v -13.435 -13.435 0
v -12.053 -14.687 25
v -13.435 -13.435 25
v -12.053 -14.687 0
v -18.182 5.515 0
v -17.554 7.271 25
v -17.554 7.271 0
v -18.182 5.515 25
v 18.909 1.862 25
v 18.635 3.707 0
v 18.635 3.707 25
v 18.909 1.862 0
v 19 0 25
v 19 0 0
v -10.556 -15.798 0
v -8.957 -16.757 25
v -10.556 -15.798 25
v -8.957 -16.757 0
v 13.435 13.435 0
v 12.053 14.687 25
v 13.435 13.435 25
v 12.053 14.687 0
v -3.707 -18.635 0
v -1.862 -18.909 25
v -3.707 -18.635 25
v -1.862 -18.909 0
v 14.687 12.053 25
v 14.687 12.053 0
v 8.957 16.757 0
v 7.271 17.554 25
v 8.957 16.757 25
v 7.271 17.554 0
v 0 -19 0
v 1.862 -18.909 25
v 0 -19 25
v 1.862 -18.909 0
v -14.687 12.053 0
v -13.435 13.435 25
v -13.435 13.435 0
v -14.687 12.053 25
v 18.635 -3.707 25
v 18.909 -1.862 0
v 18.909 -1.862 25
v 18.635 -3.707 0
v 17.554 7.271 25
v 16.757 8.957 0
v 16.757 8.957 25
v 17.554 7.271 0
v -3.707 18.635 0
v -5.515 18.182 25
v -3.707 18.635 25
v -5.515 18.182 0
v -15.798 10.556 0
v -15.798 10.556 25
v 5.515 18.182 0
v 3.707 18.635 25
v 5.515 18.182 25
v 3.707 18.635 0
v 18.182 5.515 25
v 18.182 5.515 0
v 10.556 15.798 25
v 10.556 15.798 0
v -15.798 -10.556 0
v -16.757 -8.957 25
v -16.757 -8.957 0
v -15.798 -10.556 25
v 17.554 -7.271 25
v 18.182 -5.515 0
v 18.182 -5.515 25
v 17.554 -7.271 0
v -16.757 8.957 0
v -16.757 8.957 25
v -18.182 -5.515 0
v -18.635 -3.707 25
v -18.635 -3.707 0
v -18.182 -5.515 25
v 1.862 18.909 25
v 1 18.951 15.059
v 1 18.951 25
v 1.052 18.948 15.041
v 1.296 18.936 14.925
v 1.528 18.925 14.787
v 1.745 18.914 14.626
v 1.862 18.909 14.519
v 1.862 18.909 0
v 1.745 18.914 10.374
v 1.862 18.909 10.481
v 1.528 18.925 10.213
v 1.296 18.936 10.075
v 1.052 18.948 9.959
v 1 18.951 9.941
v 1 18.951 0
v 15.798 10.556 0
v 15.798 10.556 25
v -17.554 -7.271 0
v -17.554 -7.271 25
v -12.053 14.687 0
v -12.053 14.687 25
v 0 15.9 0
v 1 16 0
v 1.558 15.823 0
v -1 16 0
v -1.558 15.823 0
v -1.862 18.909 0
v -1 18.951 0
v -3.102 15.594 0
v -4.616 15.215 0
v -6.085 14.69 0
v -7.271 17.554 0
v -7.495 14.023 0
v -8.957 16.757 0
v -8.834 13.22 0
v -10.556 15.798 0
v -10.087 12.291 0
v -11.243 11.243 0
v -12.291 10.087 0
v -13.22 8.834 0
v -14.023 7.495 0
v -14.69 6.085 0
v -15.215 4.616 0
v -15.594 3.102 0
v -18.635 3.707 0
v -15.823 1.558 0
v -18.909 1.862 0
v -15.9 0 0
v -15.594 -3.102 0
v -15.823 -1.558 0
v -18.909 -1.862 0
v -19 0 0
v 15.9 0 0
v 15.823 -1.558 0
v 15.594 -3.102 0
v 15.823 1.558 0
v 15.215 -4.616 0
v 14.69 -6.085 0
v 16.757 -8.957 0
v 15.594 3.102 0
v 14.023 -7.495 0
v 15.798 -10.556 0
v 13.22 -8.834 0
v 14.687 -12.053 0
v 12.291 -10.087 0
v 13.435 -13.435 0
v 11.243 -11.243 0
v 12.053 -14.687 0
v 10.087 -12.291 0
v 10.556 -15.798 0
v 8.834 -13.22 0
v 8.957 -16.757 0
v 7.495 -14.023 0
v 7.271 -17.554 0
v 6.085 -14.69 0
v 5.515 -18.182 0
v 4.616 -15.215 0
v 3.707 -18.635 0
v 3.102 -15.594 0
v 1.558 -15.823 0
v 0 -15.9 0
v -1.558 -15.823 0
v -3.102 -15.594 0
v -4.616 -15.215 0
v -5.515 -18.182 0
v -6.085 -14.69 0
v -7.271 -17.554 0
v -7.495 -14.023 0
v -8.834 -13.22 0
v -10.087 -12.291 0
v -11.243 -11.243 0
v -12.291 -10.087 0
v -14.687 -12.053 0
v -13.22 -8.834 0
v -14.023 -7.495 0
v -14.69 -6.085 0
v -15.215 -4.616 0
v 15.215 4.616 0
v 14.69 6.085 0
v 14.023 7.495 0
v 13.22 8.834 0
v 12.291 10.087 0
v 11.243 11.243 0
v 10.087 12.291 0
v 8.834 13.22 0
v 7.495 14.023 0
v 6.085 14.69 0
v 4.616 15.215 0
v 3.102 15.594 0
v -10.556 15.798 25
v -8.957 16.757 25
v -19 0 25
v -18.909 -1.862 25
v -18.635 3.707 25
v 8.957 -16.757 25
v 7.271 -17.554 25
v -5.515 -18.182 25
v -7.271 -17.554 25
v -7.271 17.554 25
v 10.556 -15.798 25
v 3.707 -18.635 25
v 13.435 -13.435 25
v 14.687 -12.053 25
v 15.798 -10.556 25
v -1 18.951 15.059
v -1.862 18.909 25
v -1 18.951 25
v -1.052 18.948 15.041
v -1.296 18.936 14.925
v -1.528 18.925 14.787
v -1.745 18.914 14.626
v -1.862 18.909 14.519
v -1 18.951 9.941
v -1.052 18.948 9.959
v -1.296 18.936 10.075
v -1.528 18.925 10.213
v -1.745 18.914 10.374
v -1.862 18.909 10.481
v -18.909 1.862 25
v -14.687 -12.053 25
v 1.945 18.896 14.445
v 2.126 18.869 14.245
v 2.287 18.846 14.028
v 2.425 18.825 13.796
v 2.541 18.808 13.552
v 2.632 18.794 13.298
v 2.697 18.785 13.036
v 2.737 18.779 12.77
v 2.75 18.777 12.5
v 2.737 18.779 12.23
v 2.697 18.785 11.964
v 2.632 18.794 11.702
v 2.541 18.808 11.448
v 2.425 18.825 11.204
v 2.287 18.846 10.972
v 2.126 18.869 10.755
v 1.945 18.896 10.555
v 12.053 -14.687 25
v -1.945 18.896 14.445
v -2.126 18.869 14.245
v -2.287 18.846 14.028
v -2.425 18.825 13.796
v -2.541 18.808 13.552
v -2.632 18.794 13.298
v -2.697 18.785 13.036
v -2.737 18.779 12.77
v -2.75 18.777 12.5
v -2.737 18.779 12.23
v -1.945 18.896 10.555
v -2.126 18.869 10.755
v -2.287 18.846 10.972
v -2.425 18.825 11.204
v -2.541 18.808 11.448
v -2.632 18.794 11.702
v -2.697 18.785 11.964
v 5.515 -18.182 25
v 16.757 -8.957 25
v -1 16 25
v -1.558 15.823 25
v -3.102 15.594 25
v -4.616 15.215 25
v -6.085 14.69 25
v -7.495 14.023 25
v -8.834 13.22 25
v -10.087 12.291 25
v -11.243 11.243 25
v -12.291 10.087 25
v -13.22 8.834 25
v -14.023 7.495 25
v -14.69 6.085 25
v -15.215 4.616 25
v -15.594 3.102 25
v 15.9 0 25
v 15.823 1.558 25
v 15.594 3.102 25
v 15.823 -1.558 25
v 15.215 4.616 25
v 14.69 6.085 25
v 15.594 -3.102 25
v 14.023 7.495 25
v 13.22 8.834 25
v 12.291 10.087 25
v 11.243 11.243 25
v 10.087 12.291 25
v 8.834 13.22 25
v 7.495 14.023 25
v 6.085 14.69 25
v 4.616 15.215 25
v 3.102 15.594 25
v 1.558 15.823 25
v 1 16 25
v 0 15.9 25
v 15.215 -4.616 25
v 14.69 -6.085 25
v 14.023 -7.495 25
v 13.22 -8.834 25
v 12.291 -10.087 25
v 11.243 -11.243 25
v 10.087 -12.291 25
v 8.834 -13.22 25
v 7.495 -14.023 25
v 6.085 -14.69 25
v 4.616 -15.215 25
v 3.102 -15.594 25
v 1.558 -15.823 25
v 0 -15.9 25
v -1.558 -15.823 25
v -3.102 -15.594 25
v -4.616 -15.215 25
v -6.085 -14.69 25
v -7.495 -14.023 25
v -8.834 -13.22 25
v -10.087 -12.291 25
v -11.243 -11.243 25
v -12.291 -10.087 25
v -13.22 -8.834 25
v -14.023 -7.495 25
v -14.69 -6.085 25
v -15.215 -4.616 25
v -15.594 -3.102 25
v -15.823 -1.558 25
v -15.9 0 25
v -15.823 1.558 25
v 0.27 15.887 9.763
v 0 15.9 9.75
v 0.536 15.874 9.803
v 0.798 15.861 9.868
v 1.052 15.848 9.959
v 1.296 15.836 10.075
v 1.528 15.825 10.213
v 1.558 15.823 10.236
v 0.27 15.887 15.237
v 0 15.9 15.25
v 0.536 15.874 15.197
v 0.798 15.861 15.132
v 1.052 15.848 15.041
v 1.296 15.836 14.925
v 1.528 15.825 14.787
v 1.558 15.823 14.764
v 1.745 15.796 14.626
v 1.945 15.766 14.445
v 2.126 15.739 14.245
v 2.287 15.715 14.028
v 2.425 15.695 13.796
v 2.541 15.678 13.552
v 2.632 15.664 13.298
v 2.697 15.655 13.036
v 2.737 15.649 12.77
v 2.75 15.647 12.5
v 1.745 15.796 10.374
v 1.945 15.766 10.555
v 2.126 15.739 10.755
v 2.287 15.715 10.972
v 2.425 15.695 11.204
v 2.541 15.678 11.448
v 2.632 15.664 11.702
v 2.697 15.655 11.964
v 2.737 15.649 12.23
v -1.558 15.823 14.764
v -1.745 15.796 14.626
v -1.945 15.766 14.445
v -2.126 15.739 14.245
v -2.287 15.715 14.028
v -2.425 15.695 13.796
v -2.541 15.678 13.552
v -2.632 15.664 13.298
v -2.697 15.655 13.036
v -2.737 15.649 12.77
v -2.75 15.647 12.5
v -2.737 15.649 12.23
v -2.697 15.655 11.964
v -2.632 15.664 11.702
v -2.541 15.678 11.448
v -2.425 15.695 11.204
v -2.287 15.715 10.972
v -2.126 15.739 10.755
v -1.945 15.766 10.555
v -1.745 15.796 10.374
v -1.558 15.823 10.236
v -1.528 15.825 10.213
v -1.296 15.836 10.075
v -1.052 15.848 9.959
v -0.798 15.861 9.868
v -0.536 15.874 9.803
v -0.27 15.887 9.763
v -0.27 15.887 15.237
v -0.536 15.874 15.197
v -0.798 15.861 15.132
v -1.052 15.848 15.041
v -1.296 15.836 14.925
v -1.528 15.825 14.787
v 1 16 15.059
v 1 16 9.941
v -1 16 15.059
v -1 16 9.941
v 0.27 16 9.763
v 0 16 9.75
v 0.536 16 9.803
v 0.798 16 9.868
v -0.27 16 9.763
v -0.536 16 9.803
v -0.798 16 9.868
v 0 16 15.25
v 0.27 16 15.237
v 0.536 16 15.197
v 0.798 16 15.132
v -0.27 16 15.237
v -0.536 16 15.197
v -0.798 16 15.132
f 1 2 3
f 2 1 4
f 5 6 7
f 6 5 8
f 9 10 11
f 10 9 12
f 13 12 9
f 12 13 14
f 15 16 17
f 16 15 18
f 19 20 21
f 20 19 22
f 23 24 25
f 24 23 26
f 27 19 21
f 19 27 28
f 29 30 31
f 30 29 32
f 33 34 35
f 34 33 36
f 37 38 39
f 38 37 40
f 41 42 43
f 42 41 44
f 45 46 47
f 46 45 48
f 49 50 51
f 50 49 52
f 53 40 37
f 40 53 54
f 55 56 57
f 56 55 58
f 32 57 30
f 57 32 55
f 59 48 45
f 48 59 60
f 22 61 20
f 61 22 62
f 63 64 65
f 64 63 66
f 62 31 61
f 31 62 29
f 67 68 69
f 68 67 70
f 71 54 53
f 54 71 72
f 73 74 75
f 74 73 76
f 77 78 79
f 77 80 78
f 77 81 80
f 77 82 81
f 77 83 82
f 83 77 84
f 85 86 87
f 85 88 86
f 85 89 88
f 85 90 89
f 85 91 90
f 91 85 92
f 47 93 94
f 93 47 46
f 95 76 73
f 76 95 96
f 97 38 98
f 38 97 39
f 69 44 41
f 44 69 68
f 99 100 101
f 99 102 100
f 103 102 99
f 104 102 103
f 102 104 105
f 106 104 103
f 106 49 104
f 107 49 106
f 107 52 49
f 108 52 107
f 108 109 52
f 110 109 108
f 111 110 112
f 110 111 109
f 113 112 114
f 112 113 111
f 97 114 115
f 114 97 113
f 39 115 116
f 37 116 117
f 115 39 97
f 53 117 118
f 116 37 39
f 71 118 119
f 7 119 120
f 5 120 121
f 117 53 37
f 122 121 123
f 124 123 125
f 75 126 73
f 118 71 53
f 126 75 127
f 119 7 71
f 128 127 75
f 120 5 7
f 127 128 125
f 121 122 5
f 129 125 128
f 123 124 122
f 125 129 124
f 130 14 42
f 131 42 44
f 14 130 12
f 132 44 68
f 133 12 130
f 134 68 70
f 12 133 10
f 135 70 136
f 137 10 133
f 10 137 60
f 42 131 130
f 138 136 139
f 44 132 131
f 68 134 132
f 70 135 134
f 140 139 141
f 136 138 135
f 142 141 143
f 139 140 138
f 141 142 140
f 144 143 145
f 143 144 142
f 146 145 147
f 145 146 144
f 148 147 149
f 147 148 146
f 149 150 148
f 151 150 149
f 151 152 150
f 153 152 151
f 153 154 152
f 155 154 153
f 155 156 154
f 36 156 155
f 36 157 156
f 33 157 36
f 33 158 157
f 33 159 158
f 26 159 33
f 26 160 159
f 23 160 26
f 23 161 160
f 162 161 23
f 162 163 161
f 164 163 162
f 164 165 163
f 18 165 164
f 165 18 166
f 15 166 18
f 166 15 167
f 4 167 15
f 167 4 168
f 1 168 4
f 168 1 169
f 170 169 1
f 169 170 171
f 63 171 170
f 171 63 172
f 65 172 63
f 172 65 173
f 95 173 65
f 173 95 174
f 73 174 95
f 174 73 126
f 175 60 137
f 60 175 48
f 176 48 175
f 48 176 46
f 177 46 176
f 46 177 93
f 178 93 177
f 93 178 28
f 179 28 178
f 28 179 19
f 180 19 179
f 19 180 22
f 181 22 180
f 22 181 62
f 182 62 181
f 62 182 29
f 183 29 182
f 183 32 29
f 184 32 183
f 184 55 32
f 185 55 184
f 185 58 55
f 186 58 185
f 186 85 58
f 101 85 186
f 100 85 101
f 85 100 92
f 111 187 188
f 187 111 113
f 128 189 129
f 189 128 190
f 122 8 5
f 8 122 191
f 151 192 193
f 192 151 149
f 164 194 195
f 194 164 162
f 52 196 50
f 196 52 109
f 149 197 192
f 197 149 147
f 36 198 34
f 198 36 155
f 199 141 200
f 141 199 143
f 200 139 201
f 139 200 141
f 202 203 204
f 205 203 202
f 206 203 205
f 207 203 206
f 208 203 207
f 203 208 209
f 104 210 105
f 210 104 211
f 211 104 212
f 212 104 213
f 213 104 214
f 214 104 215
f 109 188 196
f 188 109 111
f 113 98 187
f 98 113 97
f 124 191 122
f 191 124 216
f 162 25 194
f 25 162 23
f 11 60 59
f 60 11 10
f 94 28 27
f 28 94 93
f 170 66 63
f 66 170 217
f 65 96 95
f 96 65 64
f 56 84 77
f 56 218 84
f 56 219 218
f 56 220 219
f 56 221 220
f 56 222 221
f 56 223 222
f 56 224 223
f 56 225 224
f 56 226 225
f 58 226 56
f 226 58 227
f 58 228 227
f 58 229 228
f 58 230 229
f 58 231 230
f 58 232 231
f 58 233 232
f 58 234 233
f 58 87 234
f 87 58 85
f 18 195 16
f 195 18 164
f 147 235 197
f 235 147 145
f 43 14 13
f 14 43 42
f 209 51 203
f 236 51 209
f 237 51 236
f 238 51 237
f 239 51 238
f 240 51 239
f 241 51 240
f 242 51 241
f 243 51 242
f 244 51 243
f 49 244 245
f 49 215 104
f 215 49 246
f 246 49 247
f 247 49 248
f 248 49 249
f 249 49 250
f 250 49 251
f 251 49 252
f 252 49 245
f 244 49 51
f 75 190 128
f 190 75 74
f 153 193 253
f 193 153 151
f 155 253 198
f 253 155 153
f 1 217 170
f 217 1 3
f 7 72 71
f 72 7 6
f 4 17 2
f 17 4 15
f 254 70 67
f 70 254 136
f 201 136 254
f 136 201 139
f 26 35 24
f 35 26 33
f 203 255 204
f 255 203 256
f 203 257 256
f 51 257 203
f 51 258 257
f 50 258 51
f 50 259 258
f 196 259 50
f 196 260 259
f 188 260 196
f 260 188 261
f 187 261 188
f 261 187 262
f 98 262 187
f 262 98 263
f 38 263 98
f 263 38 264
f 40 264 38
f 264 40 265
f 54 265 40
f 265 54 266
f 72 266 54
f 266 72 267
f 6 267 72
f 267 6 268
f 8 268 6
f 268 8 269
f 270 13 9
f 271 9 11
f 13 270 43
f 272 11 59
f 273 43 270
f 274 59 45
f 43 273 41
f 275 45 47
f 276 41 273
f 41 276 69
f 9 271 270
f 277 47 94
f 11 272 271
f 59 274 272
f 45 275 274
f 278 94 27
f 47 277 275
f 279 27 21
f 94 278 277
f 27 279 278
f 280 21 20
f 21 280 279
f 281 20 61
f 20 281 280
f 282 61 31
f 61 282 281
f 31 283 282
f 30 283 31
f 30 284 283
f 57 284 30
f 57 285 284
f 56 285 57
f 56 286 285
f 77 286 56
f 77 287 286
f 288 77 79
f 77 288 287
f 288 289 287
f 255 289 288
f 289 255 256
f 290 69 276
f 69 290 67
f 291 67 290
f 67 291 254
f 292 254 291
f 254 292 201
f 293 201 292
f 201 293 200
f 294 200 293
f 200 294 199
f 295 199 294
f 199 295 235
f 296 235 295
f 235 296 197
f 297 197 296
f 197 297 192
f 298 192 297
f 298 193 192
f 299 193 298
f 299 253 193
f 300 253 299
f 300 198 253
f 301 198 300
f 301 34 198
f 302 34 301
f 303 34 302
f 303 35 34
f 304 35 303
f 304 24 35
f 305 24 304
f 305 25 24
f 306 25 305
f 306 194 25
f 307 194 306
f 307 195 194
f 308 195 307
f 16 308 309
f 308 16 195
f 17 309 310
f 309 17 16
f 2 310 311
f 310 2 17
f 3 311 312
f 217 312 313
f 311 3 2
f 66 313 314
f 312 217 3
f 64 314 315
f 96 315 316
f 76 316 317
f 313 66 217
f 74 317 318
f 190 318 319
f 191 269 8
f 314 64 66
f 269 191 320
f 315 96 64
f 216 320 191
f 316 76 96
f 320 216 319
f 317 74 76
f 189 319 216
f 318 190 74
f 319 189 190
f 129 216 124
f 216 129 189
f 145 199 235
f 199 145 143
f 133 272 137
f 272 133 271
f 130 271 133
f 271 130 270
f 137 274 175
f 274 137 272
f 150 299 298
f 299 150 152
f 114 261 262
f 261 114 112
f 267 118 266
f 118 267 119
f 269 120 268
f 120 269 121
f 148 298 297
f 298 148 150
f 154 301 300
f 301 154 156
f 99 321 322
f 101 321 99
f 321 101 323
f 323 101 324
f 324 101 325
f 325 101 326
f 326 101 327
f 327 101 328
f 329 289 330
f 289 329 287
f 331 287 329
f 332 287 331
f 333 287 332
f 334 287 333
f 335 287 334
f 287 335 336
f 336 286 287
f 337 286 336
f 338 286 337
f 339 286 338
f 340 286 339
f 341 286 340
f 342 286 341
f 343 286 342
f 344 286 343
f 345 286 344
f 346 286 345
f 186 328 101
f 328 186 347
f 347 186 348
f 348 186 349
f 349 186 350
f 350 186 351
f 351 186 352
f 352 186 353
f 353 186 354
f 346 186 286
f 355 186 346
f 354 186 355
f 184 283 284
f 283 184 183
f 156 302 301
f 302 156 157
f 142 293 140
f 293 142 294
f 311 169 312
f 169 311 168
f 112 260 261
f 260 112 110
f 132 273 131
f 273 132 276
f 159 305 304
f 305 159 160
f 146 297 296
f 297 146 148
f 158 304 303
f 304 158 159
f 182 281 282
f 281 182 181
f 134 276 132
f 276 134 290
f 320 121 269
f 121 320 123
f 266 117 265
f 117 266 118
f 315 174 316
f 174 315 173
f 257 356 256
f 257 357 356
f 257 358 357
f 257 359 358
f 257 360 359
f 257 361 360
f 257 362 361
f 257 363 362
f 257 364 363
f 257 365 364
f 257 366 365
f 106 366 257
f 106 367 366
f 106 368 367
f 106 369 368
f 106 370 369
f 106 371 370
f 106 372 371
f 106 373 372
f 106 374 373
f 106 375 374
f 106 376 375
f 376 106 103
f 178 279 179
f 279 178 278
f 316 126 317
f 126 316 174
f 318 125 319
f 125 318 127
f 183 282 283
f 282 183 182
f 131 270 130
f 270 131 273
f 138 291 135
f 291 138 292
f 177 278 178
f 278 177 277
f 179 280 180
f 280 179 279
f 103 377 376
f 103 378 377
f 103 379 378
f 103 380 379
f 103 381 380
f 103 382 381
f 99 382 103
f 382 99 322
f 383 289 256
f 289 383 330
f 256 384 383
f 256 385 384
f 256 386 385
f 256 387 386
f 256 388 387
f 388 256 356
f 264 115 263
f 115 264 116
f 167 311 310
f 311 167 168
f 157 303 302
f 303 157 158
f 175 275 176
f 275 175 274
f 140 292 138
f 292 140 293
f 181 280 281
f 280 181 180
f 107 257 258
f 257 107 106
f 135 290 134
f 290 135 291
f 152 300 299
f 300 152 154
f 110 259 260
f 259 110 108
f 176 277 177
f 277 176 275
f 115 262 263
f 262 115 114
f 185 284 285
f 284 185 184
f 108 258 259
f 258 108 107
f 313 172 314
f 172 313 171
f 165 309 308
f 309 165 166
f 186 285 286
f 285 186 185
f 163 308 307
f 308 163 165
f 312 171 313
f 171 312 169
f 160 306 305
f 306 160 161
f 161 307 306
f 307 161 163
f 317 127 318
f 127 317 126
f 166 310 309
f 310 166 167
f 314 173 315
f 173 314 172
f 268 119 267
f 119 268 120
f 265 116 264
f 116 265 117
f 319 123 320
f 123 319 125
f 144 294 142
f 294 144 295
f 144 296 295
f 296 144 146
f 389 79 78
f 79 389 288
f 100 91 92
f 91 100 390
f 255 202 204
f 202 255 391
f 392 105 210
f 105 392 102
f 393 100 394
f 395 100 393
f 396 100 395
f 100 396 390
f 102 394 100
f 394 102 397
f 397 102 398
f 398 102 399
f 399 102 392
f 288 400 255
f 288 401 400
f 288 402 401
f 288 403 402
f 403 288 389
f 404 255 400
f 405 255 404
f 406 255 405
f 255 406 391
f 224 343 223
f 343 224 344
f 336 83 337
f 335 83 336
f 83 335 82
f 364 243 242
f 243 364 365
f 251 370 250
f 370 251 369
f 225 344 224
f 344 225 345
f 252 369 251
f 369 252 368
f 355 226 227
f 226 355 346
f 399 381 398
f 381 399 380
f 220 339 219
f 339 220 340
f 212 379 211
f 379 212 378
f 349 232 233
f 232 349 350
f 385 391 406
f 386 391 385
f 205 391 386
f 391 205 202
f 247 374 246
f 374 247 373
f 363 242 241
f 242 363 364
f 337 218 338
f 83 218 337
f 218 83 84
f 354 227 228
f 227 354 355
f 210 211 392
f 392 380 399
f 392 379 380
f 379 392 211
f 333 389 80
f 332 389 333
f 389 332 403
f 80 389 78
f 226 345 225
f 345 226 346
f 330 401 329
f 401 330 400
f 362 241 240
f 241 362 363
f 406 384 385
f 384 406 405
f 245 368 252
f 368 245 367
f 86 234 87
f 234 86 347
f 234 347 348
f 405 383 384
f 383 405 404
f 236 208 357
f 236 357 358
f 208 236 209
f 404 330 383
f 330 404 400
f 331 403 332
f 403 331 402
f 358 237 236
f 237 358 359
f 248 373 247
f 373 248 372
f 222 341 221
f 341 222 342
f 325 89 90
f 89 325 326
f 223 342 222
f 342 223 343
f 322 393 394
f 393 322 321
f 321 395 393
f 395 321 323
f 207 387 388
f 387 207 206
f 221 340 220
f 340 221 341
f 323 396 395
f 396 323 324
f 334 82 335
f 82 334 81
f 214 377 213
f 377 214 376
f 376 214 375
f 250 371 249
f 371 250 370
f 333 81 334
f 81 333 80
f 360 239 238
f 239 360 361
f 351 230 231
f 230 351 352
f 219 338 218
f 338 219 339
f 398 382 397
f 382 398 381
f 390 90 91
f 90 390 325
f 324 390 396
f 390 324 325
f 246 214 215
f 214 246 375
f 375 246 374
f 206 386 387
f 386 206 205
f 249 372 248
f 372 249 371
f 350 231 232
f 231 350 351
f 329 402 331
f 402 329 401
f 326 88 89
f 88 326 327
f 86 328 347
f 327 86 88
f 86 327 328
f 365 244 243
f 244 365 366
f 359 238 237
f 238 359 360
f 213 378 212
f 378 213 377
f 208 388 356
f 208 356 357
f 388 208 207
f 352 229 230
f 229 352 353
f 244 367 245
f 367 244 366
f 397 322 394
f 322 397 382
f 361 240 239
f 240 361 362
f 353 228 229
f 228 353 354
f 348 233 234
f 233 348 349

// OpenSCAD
// file: ../../config.scad
// Ebike Configuration
// All dimensions in mm

// =============================================================================
// RIDER PARAMETERS
// =============================================================================
rider_height = 173;
rider_weight = 55;

// =============================================================================
// FRAME GEOMETRY
// =============================================================================
frame_size = 520;                    // Seat tube center-to-top
top_tube_effective = 545;
head_tube_length = 140;
head_tube_angle = 70;
seat_tube_angle = 72;
chainstay_length = 460;
bb_drop = 65;
wheelbase = 1080;
standover_height = 450;              // Step-through
stack = 620;
reach = 370;

// =============================================================================
// TUBE DIAMETERS
// =============================================================================
head_tube_id = 44;                   // 1-1/8" straight steerer
head_tube_od = 49;
seat_tube_id = 27.2;                 // Standard seatpost
down_tube_od = 44;
top_tube_od = 32;
seat_stay_od = 16;
chainstay_od = 22;

// =============================================================================
// MOTOR CONFIGURATION
// =============================================================================
motor_type = "mid-drive";
bb_shell_width = 68;                 // BSA standard
bb_clearance_width = 120;

// =============================================================================
// DROPOUT PARAMETERS
// =============================================================================
dropout_material = "6061-T6";
dropout_thickness = 10;
dropout_width = 45;
dropout_height = 80;
dropout_axle_spacing = 142;          // Boost thru-axle
dropout_axle_diameter = 12;

// =============================================================================
// BOTTOM BRACKET SHELL
// =============================================================================
bb_shell_od = 42;
bb_shell_id = 34.8;                  // BSA threaded
bb_thread_tpi = 24;                  // BSA 1.37" x 24 TPI

// =============================================================================
// HEAD TUBE
// =============================================================================
// Uses head_tube_length, head_tube_id, head_tube_od from above

// =============================================================================
// SEAT COLLAR
// =============================================================================
seat_collar_id = 31.8;               // For 27.2mm post with shim
seat_collar_od = 38;
seat_collar_height = 25;

// =============================================================================
// MOTOR MOUNT
// =============================================================================
motor_mount_thickness = 8;
motor_mount_width = 120;
motor_mount_height = 100;

// =============================================================================
// BATTERY MOUNT
// =============================================================================
battery_mount_thickness = 6;
battery_mount_width = 60;
battery_mount_height = 40;
battery_mount_quantity = 4;

// =============================================================================
// BRAKE MOUNT (Post Mount)
// =============================================================================
brake_mount_thickness = 10;
brake_mount_width = 80;
brake_mount_height = 50;
brake_post_bolt_spacing = 74;        // Post mount standard
brake_rotor_size_front = 180;
brake_rotor_size_rear = 160;

// =============================================================================
// CABLE GUIDES
// =============================================================================
cable_guide_length = 25;
cable_guide_width = 15;
cable_guide_height = 8;
cable_guide_quantity = 6;

// =============================================================================
// HEADSET CUPS
// =============================================================================
headset_cup_od = 44;
headset_bearing_seat = 30;

// =============================================================================
// RACK/FENDER MOUNTS
// =============================================================================
rack_mount_length = 30;
rack_mount_width = 20;
rack_mount_height = 10;
rack_mount_thread = 5;               // M5
rack_mount_quantity = 4;

// =============================================================================
// GUSSET PLATES
// =============================================================================
gusset_thickness = 6;
gusset_width = 80;
gusset_height = 60;
gusset_quantity = 2;

// =============================================================================
// COMPOSITE FRAME TUBES (FibreSeeker 3)
// =============================================================================
// Wall thickness for carbon fiber reinforced tubes
tube_wall_thickness = 3;

// Down tube (curved for step-through)
down_tube_length = 650;              // Along curve
down_tube_curve_radius = 800;        // Radius of curve

// Seat tube
seat_tube_length = 520;              // frame_size
seat_tube_od = 34;                   // Outer diameter

// Chainstays
chainstay_wall = 2.5;

// Seat stays
seat_stay_length = 480;
seat_stay_wall = 2;

// =============================================================================
// TUBE SECTIONING (for build volume constraints)
// =============================================================================
// Joint design: internal aluminum sleeve with M6 through-bolts
joint_overlap = 30;                  // Overlap length per joint
joint_bolt_diameter = 6;             // M6 bolts
joint_bolt_count = 2;                // Bolts per joint

// Section counts
down_tube_sections = 3;
seat_tube_sections = 2;
chainstay_sections = 2;
seat_stay_sections = 2;

// Sleeve parameters (CNC milled aluminum)
sleeve_wall_thickness = 2;
sleeve_length = 60;                  // Total sleeve length (2x overlap)

// =============================================================================
// MANUFACTURING TOLERANCES
// =============================================================================
tolerance_press_fit = 0.05;
tolerance_general = 0.1;

// =============================================================================
// COMMON CONSTANTS
// =============================================================================
$fn = 64;                            // Circle resolution
epsilon = 0.01;                      // For boolean operations
// main file
// Seat Tube Collar
// CNC milled component for NestWorks C500

include <../../config.scad>

module seat_collar() {
    difference() {
        // Outer cylinder
        cylinder(h = seat_collar_height, d = seat_collar_od);

        // Inner bore
        translate([0, 0, -epsilon])
            cylinder(h = seat_collar_height + 2*epsilon, d = seat_collar_id);

        // Clamp slot
        translate([-1, seat_collar_od/2 - 3, -epsilon])
            cube([2, 10, seat_collar_height + 2*epsilon]);

        // Clamp bolt hole (M5)
        translate([0, seat_collar_od/2 + 2, seat_collar_height/2])
            rotate([90, 0, 0])
                cylinder(h = 10, d = 5.5);
    }
}

// Render for preview
seat_collar();
